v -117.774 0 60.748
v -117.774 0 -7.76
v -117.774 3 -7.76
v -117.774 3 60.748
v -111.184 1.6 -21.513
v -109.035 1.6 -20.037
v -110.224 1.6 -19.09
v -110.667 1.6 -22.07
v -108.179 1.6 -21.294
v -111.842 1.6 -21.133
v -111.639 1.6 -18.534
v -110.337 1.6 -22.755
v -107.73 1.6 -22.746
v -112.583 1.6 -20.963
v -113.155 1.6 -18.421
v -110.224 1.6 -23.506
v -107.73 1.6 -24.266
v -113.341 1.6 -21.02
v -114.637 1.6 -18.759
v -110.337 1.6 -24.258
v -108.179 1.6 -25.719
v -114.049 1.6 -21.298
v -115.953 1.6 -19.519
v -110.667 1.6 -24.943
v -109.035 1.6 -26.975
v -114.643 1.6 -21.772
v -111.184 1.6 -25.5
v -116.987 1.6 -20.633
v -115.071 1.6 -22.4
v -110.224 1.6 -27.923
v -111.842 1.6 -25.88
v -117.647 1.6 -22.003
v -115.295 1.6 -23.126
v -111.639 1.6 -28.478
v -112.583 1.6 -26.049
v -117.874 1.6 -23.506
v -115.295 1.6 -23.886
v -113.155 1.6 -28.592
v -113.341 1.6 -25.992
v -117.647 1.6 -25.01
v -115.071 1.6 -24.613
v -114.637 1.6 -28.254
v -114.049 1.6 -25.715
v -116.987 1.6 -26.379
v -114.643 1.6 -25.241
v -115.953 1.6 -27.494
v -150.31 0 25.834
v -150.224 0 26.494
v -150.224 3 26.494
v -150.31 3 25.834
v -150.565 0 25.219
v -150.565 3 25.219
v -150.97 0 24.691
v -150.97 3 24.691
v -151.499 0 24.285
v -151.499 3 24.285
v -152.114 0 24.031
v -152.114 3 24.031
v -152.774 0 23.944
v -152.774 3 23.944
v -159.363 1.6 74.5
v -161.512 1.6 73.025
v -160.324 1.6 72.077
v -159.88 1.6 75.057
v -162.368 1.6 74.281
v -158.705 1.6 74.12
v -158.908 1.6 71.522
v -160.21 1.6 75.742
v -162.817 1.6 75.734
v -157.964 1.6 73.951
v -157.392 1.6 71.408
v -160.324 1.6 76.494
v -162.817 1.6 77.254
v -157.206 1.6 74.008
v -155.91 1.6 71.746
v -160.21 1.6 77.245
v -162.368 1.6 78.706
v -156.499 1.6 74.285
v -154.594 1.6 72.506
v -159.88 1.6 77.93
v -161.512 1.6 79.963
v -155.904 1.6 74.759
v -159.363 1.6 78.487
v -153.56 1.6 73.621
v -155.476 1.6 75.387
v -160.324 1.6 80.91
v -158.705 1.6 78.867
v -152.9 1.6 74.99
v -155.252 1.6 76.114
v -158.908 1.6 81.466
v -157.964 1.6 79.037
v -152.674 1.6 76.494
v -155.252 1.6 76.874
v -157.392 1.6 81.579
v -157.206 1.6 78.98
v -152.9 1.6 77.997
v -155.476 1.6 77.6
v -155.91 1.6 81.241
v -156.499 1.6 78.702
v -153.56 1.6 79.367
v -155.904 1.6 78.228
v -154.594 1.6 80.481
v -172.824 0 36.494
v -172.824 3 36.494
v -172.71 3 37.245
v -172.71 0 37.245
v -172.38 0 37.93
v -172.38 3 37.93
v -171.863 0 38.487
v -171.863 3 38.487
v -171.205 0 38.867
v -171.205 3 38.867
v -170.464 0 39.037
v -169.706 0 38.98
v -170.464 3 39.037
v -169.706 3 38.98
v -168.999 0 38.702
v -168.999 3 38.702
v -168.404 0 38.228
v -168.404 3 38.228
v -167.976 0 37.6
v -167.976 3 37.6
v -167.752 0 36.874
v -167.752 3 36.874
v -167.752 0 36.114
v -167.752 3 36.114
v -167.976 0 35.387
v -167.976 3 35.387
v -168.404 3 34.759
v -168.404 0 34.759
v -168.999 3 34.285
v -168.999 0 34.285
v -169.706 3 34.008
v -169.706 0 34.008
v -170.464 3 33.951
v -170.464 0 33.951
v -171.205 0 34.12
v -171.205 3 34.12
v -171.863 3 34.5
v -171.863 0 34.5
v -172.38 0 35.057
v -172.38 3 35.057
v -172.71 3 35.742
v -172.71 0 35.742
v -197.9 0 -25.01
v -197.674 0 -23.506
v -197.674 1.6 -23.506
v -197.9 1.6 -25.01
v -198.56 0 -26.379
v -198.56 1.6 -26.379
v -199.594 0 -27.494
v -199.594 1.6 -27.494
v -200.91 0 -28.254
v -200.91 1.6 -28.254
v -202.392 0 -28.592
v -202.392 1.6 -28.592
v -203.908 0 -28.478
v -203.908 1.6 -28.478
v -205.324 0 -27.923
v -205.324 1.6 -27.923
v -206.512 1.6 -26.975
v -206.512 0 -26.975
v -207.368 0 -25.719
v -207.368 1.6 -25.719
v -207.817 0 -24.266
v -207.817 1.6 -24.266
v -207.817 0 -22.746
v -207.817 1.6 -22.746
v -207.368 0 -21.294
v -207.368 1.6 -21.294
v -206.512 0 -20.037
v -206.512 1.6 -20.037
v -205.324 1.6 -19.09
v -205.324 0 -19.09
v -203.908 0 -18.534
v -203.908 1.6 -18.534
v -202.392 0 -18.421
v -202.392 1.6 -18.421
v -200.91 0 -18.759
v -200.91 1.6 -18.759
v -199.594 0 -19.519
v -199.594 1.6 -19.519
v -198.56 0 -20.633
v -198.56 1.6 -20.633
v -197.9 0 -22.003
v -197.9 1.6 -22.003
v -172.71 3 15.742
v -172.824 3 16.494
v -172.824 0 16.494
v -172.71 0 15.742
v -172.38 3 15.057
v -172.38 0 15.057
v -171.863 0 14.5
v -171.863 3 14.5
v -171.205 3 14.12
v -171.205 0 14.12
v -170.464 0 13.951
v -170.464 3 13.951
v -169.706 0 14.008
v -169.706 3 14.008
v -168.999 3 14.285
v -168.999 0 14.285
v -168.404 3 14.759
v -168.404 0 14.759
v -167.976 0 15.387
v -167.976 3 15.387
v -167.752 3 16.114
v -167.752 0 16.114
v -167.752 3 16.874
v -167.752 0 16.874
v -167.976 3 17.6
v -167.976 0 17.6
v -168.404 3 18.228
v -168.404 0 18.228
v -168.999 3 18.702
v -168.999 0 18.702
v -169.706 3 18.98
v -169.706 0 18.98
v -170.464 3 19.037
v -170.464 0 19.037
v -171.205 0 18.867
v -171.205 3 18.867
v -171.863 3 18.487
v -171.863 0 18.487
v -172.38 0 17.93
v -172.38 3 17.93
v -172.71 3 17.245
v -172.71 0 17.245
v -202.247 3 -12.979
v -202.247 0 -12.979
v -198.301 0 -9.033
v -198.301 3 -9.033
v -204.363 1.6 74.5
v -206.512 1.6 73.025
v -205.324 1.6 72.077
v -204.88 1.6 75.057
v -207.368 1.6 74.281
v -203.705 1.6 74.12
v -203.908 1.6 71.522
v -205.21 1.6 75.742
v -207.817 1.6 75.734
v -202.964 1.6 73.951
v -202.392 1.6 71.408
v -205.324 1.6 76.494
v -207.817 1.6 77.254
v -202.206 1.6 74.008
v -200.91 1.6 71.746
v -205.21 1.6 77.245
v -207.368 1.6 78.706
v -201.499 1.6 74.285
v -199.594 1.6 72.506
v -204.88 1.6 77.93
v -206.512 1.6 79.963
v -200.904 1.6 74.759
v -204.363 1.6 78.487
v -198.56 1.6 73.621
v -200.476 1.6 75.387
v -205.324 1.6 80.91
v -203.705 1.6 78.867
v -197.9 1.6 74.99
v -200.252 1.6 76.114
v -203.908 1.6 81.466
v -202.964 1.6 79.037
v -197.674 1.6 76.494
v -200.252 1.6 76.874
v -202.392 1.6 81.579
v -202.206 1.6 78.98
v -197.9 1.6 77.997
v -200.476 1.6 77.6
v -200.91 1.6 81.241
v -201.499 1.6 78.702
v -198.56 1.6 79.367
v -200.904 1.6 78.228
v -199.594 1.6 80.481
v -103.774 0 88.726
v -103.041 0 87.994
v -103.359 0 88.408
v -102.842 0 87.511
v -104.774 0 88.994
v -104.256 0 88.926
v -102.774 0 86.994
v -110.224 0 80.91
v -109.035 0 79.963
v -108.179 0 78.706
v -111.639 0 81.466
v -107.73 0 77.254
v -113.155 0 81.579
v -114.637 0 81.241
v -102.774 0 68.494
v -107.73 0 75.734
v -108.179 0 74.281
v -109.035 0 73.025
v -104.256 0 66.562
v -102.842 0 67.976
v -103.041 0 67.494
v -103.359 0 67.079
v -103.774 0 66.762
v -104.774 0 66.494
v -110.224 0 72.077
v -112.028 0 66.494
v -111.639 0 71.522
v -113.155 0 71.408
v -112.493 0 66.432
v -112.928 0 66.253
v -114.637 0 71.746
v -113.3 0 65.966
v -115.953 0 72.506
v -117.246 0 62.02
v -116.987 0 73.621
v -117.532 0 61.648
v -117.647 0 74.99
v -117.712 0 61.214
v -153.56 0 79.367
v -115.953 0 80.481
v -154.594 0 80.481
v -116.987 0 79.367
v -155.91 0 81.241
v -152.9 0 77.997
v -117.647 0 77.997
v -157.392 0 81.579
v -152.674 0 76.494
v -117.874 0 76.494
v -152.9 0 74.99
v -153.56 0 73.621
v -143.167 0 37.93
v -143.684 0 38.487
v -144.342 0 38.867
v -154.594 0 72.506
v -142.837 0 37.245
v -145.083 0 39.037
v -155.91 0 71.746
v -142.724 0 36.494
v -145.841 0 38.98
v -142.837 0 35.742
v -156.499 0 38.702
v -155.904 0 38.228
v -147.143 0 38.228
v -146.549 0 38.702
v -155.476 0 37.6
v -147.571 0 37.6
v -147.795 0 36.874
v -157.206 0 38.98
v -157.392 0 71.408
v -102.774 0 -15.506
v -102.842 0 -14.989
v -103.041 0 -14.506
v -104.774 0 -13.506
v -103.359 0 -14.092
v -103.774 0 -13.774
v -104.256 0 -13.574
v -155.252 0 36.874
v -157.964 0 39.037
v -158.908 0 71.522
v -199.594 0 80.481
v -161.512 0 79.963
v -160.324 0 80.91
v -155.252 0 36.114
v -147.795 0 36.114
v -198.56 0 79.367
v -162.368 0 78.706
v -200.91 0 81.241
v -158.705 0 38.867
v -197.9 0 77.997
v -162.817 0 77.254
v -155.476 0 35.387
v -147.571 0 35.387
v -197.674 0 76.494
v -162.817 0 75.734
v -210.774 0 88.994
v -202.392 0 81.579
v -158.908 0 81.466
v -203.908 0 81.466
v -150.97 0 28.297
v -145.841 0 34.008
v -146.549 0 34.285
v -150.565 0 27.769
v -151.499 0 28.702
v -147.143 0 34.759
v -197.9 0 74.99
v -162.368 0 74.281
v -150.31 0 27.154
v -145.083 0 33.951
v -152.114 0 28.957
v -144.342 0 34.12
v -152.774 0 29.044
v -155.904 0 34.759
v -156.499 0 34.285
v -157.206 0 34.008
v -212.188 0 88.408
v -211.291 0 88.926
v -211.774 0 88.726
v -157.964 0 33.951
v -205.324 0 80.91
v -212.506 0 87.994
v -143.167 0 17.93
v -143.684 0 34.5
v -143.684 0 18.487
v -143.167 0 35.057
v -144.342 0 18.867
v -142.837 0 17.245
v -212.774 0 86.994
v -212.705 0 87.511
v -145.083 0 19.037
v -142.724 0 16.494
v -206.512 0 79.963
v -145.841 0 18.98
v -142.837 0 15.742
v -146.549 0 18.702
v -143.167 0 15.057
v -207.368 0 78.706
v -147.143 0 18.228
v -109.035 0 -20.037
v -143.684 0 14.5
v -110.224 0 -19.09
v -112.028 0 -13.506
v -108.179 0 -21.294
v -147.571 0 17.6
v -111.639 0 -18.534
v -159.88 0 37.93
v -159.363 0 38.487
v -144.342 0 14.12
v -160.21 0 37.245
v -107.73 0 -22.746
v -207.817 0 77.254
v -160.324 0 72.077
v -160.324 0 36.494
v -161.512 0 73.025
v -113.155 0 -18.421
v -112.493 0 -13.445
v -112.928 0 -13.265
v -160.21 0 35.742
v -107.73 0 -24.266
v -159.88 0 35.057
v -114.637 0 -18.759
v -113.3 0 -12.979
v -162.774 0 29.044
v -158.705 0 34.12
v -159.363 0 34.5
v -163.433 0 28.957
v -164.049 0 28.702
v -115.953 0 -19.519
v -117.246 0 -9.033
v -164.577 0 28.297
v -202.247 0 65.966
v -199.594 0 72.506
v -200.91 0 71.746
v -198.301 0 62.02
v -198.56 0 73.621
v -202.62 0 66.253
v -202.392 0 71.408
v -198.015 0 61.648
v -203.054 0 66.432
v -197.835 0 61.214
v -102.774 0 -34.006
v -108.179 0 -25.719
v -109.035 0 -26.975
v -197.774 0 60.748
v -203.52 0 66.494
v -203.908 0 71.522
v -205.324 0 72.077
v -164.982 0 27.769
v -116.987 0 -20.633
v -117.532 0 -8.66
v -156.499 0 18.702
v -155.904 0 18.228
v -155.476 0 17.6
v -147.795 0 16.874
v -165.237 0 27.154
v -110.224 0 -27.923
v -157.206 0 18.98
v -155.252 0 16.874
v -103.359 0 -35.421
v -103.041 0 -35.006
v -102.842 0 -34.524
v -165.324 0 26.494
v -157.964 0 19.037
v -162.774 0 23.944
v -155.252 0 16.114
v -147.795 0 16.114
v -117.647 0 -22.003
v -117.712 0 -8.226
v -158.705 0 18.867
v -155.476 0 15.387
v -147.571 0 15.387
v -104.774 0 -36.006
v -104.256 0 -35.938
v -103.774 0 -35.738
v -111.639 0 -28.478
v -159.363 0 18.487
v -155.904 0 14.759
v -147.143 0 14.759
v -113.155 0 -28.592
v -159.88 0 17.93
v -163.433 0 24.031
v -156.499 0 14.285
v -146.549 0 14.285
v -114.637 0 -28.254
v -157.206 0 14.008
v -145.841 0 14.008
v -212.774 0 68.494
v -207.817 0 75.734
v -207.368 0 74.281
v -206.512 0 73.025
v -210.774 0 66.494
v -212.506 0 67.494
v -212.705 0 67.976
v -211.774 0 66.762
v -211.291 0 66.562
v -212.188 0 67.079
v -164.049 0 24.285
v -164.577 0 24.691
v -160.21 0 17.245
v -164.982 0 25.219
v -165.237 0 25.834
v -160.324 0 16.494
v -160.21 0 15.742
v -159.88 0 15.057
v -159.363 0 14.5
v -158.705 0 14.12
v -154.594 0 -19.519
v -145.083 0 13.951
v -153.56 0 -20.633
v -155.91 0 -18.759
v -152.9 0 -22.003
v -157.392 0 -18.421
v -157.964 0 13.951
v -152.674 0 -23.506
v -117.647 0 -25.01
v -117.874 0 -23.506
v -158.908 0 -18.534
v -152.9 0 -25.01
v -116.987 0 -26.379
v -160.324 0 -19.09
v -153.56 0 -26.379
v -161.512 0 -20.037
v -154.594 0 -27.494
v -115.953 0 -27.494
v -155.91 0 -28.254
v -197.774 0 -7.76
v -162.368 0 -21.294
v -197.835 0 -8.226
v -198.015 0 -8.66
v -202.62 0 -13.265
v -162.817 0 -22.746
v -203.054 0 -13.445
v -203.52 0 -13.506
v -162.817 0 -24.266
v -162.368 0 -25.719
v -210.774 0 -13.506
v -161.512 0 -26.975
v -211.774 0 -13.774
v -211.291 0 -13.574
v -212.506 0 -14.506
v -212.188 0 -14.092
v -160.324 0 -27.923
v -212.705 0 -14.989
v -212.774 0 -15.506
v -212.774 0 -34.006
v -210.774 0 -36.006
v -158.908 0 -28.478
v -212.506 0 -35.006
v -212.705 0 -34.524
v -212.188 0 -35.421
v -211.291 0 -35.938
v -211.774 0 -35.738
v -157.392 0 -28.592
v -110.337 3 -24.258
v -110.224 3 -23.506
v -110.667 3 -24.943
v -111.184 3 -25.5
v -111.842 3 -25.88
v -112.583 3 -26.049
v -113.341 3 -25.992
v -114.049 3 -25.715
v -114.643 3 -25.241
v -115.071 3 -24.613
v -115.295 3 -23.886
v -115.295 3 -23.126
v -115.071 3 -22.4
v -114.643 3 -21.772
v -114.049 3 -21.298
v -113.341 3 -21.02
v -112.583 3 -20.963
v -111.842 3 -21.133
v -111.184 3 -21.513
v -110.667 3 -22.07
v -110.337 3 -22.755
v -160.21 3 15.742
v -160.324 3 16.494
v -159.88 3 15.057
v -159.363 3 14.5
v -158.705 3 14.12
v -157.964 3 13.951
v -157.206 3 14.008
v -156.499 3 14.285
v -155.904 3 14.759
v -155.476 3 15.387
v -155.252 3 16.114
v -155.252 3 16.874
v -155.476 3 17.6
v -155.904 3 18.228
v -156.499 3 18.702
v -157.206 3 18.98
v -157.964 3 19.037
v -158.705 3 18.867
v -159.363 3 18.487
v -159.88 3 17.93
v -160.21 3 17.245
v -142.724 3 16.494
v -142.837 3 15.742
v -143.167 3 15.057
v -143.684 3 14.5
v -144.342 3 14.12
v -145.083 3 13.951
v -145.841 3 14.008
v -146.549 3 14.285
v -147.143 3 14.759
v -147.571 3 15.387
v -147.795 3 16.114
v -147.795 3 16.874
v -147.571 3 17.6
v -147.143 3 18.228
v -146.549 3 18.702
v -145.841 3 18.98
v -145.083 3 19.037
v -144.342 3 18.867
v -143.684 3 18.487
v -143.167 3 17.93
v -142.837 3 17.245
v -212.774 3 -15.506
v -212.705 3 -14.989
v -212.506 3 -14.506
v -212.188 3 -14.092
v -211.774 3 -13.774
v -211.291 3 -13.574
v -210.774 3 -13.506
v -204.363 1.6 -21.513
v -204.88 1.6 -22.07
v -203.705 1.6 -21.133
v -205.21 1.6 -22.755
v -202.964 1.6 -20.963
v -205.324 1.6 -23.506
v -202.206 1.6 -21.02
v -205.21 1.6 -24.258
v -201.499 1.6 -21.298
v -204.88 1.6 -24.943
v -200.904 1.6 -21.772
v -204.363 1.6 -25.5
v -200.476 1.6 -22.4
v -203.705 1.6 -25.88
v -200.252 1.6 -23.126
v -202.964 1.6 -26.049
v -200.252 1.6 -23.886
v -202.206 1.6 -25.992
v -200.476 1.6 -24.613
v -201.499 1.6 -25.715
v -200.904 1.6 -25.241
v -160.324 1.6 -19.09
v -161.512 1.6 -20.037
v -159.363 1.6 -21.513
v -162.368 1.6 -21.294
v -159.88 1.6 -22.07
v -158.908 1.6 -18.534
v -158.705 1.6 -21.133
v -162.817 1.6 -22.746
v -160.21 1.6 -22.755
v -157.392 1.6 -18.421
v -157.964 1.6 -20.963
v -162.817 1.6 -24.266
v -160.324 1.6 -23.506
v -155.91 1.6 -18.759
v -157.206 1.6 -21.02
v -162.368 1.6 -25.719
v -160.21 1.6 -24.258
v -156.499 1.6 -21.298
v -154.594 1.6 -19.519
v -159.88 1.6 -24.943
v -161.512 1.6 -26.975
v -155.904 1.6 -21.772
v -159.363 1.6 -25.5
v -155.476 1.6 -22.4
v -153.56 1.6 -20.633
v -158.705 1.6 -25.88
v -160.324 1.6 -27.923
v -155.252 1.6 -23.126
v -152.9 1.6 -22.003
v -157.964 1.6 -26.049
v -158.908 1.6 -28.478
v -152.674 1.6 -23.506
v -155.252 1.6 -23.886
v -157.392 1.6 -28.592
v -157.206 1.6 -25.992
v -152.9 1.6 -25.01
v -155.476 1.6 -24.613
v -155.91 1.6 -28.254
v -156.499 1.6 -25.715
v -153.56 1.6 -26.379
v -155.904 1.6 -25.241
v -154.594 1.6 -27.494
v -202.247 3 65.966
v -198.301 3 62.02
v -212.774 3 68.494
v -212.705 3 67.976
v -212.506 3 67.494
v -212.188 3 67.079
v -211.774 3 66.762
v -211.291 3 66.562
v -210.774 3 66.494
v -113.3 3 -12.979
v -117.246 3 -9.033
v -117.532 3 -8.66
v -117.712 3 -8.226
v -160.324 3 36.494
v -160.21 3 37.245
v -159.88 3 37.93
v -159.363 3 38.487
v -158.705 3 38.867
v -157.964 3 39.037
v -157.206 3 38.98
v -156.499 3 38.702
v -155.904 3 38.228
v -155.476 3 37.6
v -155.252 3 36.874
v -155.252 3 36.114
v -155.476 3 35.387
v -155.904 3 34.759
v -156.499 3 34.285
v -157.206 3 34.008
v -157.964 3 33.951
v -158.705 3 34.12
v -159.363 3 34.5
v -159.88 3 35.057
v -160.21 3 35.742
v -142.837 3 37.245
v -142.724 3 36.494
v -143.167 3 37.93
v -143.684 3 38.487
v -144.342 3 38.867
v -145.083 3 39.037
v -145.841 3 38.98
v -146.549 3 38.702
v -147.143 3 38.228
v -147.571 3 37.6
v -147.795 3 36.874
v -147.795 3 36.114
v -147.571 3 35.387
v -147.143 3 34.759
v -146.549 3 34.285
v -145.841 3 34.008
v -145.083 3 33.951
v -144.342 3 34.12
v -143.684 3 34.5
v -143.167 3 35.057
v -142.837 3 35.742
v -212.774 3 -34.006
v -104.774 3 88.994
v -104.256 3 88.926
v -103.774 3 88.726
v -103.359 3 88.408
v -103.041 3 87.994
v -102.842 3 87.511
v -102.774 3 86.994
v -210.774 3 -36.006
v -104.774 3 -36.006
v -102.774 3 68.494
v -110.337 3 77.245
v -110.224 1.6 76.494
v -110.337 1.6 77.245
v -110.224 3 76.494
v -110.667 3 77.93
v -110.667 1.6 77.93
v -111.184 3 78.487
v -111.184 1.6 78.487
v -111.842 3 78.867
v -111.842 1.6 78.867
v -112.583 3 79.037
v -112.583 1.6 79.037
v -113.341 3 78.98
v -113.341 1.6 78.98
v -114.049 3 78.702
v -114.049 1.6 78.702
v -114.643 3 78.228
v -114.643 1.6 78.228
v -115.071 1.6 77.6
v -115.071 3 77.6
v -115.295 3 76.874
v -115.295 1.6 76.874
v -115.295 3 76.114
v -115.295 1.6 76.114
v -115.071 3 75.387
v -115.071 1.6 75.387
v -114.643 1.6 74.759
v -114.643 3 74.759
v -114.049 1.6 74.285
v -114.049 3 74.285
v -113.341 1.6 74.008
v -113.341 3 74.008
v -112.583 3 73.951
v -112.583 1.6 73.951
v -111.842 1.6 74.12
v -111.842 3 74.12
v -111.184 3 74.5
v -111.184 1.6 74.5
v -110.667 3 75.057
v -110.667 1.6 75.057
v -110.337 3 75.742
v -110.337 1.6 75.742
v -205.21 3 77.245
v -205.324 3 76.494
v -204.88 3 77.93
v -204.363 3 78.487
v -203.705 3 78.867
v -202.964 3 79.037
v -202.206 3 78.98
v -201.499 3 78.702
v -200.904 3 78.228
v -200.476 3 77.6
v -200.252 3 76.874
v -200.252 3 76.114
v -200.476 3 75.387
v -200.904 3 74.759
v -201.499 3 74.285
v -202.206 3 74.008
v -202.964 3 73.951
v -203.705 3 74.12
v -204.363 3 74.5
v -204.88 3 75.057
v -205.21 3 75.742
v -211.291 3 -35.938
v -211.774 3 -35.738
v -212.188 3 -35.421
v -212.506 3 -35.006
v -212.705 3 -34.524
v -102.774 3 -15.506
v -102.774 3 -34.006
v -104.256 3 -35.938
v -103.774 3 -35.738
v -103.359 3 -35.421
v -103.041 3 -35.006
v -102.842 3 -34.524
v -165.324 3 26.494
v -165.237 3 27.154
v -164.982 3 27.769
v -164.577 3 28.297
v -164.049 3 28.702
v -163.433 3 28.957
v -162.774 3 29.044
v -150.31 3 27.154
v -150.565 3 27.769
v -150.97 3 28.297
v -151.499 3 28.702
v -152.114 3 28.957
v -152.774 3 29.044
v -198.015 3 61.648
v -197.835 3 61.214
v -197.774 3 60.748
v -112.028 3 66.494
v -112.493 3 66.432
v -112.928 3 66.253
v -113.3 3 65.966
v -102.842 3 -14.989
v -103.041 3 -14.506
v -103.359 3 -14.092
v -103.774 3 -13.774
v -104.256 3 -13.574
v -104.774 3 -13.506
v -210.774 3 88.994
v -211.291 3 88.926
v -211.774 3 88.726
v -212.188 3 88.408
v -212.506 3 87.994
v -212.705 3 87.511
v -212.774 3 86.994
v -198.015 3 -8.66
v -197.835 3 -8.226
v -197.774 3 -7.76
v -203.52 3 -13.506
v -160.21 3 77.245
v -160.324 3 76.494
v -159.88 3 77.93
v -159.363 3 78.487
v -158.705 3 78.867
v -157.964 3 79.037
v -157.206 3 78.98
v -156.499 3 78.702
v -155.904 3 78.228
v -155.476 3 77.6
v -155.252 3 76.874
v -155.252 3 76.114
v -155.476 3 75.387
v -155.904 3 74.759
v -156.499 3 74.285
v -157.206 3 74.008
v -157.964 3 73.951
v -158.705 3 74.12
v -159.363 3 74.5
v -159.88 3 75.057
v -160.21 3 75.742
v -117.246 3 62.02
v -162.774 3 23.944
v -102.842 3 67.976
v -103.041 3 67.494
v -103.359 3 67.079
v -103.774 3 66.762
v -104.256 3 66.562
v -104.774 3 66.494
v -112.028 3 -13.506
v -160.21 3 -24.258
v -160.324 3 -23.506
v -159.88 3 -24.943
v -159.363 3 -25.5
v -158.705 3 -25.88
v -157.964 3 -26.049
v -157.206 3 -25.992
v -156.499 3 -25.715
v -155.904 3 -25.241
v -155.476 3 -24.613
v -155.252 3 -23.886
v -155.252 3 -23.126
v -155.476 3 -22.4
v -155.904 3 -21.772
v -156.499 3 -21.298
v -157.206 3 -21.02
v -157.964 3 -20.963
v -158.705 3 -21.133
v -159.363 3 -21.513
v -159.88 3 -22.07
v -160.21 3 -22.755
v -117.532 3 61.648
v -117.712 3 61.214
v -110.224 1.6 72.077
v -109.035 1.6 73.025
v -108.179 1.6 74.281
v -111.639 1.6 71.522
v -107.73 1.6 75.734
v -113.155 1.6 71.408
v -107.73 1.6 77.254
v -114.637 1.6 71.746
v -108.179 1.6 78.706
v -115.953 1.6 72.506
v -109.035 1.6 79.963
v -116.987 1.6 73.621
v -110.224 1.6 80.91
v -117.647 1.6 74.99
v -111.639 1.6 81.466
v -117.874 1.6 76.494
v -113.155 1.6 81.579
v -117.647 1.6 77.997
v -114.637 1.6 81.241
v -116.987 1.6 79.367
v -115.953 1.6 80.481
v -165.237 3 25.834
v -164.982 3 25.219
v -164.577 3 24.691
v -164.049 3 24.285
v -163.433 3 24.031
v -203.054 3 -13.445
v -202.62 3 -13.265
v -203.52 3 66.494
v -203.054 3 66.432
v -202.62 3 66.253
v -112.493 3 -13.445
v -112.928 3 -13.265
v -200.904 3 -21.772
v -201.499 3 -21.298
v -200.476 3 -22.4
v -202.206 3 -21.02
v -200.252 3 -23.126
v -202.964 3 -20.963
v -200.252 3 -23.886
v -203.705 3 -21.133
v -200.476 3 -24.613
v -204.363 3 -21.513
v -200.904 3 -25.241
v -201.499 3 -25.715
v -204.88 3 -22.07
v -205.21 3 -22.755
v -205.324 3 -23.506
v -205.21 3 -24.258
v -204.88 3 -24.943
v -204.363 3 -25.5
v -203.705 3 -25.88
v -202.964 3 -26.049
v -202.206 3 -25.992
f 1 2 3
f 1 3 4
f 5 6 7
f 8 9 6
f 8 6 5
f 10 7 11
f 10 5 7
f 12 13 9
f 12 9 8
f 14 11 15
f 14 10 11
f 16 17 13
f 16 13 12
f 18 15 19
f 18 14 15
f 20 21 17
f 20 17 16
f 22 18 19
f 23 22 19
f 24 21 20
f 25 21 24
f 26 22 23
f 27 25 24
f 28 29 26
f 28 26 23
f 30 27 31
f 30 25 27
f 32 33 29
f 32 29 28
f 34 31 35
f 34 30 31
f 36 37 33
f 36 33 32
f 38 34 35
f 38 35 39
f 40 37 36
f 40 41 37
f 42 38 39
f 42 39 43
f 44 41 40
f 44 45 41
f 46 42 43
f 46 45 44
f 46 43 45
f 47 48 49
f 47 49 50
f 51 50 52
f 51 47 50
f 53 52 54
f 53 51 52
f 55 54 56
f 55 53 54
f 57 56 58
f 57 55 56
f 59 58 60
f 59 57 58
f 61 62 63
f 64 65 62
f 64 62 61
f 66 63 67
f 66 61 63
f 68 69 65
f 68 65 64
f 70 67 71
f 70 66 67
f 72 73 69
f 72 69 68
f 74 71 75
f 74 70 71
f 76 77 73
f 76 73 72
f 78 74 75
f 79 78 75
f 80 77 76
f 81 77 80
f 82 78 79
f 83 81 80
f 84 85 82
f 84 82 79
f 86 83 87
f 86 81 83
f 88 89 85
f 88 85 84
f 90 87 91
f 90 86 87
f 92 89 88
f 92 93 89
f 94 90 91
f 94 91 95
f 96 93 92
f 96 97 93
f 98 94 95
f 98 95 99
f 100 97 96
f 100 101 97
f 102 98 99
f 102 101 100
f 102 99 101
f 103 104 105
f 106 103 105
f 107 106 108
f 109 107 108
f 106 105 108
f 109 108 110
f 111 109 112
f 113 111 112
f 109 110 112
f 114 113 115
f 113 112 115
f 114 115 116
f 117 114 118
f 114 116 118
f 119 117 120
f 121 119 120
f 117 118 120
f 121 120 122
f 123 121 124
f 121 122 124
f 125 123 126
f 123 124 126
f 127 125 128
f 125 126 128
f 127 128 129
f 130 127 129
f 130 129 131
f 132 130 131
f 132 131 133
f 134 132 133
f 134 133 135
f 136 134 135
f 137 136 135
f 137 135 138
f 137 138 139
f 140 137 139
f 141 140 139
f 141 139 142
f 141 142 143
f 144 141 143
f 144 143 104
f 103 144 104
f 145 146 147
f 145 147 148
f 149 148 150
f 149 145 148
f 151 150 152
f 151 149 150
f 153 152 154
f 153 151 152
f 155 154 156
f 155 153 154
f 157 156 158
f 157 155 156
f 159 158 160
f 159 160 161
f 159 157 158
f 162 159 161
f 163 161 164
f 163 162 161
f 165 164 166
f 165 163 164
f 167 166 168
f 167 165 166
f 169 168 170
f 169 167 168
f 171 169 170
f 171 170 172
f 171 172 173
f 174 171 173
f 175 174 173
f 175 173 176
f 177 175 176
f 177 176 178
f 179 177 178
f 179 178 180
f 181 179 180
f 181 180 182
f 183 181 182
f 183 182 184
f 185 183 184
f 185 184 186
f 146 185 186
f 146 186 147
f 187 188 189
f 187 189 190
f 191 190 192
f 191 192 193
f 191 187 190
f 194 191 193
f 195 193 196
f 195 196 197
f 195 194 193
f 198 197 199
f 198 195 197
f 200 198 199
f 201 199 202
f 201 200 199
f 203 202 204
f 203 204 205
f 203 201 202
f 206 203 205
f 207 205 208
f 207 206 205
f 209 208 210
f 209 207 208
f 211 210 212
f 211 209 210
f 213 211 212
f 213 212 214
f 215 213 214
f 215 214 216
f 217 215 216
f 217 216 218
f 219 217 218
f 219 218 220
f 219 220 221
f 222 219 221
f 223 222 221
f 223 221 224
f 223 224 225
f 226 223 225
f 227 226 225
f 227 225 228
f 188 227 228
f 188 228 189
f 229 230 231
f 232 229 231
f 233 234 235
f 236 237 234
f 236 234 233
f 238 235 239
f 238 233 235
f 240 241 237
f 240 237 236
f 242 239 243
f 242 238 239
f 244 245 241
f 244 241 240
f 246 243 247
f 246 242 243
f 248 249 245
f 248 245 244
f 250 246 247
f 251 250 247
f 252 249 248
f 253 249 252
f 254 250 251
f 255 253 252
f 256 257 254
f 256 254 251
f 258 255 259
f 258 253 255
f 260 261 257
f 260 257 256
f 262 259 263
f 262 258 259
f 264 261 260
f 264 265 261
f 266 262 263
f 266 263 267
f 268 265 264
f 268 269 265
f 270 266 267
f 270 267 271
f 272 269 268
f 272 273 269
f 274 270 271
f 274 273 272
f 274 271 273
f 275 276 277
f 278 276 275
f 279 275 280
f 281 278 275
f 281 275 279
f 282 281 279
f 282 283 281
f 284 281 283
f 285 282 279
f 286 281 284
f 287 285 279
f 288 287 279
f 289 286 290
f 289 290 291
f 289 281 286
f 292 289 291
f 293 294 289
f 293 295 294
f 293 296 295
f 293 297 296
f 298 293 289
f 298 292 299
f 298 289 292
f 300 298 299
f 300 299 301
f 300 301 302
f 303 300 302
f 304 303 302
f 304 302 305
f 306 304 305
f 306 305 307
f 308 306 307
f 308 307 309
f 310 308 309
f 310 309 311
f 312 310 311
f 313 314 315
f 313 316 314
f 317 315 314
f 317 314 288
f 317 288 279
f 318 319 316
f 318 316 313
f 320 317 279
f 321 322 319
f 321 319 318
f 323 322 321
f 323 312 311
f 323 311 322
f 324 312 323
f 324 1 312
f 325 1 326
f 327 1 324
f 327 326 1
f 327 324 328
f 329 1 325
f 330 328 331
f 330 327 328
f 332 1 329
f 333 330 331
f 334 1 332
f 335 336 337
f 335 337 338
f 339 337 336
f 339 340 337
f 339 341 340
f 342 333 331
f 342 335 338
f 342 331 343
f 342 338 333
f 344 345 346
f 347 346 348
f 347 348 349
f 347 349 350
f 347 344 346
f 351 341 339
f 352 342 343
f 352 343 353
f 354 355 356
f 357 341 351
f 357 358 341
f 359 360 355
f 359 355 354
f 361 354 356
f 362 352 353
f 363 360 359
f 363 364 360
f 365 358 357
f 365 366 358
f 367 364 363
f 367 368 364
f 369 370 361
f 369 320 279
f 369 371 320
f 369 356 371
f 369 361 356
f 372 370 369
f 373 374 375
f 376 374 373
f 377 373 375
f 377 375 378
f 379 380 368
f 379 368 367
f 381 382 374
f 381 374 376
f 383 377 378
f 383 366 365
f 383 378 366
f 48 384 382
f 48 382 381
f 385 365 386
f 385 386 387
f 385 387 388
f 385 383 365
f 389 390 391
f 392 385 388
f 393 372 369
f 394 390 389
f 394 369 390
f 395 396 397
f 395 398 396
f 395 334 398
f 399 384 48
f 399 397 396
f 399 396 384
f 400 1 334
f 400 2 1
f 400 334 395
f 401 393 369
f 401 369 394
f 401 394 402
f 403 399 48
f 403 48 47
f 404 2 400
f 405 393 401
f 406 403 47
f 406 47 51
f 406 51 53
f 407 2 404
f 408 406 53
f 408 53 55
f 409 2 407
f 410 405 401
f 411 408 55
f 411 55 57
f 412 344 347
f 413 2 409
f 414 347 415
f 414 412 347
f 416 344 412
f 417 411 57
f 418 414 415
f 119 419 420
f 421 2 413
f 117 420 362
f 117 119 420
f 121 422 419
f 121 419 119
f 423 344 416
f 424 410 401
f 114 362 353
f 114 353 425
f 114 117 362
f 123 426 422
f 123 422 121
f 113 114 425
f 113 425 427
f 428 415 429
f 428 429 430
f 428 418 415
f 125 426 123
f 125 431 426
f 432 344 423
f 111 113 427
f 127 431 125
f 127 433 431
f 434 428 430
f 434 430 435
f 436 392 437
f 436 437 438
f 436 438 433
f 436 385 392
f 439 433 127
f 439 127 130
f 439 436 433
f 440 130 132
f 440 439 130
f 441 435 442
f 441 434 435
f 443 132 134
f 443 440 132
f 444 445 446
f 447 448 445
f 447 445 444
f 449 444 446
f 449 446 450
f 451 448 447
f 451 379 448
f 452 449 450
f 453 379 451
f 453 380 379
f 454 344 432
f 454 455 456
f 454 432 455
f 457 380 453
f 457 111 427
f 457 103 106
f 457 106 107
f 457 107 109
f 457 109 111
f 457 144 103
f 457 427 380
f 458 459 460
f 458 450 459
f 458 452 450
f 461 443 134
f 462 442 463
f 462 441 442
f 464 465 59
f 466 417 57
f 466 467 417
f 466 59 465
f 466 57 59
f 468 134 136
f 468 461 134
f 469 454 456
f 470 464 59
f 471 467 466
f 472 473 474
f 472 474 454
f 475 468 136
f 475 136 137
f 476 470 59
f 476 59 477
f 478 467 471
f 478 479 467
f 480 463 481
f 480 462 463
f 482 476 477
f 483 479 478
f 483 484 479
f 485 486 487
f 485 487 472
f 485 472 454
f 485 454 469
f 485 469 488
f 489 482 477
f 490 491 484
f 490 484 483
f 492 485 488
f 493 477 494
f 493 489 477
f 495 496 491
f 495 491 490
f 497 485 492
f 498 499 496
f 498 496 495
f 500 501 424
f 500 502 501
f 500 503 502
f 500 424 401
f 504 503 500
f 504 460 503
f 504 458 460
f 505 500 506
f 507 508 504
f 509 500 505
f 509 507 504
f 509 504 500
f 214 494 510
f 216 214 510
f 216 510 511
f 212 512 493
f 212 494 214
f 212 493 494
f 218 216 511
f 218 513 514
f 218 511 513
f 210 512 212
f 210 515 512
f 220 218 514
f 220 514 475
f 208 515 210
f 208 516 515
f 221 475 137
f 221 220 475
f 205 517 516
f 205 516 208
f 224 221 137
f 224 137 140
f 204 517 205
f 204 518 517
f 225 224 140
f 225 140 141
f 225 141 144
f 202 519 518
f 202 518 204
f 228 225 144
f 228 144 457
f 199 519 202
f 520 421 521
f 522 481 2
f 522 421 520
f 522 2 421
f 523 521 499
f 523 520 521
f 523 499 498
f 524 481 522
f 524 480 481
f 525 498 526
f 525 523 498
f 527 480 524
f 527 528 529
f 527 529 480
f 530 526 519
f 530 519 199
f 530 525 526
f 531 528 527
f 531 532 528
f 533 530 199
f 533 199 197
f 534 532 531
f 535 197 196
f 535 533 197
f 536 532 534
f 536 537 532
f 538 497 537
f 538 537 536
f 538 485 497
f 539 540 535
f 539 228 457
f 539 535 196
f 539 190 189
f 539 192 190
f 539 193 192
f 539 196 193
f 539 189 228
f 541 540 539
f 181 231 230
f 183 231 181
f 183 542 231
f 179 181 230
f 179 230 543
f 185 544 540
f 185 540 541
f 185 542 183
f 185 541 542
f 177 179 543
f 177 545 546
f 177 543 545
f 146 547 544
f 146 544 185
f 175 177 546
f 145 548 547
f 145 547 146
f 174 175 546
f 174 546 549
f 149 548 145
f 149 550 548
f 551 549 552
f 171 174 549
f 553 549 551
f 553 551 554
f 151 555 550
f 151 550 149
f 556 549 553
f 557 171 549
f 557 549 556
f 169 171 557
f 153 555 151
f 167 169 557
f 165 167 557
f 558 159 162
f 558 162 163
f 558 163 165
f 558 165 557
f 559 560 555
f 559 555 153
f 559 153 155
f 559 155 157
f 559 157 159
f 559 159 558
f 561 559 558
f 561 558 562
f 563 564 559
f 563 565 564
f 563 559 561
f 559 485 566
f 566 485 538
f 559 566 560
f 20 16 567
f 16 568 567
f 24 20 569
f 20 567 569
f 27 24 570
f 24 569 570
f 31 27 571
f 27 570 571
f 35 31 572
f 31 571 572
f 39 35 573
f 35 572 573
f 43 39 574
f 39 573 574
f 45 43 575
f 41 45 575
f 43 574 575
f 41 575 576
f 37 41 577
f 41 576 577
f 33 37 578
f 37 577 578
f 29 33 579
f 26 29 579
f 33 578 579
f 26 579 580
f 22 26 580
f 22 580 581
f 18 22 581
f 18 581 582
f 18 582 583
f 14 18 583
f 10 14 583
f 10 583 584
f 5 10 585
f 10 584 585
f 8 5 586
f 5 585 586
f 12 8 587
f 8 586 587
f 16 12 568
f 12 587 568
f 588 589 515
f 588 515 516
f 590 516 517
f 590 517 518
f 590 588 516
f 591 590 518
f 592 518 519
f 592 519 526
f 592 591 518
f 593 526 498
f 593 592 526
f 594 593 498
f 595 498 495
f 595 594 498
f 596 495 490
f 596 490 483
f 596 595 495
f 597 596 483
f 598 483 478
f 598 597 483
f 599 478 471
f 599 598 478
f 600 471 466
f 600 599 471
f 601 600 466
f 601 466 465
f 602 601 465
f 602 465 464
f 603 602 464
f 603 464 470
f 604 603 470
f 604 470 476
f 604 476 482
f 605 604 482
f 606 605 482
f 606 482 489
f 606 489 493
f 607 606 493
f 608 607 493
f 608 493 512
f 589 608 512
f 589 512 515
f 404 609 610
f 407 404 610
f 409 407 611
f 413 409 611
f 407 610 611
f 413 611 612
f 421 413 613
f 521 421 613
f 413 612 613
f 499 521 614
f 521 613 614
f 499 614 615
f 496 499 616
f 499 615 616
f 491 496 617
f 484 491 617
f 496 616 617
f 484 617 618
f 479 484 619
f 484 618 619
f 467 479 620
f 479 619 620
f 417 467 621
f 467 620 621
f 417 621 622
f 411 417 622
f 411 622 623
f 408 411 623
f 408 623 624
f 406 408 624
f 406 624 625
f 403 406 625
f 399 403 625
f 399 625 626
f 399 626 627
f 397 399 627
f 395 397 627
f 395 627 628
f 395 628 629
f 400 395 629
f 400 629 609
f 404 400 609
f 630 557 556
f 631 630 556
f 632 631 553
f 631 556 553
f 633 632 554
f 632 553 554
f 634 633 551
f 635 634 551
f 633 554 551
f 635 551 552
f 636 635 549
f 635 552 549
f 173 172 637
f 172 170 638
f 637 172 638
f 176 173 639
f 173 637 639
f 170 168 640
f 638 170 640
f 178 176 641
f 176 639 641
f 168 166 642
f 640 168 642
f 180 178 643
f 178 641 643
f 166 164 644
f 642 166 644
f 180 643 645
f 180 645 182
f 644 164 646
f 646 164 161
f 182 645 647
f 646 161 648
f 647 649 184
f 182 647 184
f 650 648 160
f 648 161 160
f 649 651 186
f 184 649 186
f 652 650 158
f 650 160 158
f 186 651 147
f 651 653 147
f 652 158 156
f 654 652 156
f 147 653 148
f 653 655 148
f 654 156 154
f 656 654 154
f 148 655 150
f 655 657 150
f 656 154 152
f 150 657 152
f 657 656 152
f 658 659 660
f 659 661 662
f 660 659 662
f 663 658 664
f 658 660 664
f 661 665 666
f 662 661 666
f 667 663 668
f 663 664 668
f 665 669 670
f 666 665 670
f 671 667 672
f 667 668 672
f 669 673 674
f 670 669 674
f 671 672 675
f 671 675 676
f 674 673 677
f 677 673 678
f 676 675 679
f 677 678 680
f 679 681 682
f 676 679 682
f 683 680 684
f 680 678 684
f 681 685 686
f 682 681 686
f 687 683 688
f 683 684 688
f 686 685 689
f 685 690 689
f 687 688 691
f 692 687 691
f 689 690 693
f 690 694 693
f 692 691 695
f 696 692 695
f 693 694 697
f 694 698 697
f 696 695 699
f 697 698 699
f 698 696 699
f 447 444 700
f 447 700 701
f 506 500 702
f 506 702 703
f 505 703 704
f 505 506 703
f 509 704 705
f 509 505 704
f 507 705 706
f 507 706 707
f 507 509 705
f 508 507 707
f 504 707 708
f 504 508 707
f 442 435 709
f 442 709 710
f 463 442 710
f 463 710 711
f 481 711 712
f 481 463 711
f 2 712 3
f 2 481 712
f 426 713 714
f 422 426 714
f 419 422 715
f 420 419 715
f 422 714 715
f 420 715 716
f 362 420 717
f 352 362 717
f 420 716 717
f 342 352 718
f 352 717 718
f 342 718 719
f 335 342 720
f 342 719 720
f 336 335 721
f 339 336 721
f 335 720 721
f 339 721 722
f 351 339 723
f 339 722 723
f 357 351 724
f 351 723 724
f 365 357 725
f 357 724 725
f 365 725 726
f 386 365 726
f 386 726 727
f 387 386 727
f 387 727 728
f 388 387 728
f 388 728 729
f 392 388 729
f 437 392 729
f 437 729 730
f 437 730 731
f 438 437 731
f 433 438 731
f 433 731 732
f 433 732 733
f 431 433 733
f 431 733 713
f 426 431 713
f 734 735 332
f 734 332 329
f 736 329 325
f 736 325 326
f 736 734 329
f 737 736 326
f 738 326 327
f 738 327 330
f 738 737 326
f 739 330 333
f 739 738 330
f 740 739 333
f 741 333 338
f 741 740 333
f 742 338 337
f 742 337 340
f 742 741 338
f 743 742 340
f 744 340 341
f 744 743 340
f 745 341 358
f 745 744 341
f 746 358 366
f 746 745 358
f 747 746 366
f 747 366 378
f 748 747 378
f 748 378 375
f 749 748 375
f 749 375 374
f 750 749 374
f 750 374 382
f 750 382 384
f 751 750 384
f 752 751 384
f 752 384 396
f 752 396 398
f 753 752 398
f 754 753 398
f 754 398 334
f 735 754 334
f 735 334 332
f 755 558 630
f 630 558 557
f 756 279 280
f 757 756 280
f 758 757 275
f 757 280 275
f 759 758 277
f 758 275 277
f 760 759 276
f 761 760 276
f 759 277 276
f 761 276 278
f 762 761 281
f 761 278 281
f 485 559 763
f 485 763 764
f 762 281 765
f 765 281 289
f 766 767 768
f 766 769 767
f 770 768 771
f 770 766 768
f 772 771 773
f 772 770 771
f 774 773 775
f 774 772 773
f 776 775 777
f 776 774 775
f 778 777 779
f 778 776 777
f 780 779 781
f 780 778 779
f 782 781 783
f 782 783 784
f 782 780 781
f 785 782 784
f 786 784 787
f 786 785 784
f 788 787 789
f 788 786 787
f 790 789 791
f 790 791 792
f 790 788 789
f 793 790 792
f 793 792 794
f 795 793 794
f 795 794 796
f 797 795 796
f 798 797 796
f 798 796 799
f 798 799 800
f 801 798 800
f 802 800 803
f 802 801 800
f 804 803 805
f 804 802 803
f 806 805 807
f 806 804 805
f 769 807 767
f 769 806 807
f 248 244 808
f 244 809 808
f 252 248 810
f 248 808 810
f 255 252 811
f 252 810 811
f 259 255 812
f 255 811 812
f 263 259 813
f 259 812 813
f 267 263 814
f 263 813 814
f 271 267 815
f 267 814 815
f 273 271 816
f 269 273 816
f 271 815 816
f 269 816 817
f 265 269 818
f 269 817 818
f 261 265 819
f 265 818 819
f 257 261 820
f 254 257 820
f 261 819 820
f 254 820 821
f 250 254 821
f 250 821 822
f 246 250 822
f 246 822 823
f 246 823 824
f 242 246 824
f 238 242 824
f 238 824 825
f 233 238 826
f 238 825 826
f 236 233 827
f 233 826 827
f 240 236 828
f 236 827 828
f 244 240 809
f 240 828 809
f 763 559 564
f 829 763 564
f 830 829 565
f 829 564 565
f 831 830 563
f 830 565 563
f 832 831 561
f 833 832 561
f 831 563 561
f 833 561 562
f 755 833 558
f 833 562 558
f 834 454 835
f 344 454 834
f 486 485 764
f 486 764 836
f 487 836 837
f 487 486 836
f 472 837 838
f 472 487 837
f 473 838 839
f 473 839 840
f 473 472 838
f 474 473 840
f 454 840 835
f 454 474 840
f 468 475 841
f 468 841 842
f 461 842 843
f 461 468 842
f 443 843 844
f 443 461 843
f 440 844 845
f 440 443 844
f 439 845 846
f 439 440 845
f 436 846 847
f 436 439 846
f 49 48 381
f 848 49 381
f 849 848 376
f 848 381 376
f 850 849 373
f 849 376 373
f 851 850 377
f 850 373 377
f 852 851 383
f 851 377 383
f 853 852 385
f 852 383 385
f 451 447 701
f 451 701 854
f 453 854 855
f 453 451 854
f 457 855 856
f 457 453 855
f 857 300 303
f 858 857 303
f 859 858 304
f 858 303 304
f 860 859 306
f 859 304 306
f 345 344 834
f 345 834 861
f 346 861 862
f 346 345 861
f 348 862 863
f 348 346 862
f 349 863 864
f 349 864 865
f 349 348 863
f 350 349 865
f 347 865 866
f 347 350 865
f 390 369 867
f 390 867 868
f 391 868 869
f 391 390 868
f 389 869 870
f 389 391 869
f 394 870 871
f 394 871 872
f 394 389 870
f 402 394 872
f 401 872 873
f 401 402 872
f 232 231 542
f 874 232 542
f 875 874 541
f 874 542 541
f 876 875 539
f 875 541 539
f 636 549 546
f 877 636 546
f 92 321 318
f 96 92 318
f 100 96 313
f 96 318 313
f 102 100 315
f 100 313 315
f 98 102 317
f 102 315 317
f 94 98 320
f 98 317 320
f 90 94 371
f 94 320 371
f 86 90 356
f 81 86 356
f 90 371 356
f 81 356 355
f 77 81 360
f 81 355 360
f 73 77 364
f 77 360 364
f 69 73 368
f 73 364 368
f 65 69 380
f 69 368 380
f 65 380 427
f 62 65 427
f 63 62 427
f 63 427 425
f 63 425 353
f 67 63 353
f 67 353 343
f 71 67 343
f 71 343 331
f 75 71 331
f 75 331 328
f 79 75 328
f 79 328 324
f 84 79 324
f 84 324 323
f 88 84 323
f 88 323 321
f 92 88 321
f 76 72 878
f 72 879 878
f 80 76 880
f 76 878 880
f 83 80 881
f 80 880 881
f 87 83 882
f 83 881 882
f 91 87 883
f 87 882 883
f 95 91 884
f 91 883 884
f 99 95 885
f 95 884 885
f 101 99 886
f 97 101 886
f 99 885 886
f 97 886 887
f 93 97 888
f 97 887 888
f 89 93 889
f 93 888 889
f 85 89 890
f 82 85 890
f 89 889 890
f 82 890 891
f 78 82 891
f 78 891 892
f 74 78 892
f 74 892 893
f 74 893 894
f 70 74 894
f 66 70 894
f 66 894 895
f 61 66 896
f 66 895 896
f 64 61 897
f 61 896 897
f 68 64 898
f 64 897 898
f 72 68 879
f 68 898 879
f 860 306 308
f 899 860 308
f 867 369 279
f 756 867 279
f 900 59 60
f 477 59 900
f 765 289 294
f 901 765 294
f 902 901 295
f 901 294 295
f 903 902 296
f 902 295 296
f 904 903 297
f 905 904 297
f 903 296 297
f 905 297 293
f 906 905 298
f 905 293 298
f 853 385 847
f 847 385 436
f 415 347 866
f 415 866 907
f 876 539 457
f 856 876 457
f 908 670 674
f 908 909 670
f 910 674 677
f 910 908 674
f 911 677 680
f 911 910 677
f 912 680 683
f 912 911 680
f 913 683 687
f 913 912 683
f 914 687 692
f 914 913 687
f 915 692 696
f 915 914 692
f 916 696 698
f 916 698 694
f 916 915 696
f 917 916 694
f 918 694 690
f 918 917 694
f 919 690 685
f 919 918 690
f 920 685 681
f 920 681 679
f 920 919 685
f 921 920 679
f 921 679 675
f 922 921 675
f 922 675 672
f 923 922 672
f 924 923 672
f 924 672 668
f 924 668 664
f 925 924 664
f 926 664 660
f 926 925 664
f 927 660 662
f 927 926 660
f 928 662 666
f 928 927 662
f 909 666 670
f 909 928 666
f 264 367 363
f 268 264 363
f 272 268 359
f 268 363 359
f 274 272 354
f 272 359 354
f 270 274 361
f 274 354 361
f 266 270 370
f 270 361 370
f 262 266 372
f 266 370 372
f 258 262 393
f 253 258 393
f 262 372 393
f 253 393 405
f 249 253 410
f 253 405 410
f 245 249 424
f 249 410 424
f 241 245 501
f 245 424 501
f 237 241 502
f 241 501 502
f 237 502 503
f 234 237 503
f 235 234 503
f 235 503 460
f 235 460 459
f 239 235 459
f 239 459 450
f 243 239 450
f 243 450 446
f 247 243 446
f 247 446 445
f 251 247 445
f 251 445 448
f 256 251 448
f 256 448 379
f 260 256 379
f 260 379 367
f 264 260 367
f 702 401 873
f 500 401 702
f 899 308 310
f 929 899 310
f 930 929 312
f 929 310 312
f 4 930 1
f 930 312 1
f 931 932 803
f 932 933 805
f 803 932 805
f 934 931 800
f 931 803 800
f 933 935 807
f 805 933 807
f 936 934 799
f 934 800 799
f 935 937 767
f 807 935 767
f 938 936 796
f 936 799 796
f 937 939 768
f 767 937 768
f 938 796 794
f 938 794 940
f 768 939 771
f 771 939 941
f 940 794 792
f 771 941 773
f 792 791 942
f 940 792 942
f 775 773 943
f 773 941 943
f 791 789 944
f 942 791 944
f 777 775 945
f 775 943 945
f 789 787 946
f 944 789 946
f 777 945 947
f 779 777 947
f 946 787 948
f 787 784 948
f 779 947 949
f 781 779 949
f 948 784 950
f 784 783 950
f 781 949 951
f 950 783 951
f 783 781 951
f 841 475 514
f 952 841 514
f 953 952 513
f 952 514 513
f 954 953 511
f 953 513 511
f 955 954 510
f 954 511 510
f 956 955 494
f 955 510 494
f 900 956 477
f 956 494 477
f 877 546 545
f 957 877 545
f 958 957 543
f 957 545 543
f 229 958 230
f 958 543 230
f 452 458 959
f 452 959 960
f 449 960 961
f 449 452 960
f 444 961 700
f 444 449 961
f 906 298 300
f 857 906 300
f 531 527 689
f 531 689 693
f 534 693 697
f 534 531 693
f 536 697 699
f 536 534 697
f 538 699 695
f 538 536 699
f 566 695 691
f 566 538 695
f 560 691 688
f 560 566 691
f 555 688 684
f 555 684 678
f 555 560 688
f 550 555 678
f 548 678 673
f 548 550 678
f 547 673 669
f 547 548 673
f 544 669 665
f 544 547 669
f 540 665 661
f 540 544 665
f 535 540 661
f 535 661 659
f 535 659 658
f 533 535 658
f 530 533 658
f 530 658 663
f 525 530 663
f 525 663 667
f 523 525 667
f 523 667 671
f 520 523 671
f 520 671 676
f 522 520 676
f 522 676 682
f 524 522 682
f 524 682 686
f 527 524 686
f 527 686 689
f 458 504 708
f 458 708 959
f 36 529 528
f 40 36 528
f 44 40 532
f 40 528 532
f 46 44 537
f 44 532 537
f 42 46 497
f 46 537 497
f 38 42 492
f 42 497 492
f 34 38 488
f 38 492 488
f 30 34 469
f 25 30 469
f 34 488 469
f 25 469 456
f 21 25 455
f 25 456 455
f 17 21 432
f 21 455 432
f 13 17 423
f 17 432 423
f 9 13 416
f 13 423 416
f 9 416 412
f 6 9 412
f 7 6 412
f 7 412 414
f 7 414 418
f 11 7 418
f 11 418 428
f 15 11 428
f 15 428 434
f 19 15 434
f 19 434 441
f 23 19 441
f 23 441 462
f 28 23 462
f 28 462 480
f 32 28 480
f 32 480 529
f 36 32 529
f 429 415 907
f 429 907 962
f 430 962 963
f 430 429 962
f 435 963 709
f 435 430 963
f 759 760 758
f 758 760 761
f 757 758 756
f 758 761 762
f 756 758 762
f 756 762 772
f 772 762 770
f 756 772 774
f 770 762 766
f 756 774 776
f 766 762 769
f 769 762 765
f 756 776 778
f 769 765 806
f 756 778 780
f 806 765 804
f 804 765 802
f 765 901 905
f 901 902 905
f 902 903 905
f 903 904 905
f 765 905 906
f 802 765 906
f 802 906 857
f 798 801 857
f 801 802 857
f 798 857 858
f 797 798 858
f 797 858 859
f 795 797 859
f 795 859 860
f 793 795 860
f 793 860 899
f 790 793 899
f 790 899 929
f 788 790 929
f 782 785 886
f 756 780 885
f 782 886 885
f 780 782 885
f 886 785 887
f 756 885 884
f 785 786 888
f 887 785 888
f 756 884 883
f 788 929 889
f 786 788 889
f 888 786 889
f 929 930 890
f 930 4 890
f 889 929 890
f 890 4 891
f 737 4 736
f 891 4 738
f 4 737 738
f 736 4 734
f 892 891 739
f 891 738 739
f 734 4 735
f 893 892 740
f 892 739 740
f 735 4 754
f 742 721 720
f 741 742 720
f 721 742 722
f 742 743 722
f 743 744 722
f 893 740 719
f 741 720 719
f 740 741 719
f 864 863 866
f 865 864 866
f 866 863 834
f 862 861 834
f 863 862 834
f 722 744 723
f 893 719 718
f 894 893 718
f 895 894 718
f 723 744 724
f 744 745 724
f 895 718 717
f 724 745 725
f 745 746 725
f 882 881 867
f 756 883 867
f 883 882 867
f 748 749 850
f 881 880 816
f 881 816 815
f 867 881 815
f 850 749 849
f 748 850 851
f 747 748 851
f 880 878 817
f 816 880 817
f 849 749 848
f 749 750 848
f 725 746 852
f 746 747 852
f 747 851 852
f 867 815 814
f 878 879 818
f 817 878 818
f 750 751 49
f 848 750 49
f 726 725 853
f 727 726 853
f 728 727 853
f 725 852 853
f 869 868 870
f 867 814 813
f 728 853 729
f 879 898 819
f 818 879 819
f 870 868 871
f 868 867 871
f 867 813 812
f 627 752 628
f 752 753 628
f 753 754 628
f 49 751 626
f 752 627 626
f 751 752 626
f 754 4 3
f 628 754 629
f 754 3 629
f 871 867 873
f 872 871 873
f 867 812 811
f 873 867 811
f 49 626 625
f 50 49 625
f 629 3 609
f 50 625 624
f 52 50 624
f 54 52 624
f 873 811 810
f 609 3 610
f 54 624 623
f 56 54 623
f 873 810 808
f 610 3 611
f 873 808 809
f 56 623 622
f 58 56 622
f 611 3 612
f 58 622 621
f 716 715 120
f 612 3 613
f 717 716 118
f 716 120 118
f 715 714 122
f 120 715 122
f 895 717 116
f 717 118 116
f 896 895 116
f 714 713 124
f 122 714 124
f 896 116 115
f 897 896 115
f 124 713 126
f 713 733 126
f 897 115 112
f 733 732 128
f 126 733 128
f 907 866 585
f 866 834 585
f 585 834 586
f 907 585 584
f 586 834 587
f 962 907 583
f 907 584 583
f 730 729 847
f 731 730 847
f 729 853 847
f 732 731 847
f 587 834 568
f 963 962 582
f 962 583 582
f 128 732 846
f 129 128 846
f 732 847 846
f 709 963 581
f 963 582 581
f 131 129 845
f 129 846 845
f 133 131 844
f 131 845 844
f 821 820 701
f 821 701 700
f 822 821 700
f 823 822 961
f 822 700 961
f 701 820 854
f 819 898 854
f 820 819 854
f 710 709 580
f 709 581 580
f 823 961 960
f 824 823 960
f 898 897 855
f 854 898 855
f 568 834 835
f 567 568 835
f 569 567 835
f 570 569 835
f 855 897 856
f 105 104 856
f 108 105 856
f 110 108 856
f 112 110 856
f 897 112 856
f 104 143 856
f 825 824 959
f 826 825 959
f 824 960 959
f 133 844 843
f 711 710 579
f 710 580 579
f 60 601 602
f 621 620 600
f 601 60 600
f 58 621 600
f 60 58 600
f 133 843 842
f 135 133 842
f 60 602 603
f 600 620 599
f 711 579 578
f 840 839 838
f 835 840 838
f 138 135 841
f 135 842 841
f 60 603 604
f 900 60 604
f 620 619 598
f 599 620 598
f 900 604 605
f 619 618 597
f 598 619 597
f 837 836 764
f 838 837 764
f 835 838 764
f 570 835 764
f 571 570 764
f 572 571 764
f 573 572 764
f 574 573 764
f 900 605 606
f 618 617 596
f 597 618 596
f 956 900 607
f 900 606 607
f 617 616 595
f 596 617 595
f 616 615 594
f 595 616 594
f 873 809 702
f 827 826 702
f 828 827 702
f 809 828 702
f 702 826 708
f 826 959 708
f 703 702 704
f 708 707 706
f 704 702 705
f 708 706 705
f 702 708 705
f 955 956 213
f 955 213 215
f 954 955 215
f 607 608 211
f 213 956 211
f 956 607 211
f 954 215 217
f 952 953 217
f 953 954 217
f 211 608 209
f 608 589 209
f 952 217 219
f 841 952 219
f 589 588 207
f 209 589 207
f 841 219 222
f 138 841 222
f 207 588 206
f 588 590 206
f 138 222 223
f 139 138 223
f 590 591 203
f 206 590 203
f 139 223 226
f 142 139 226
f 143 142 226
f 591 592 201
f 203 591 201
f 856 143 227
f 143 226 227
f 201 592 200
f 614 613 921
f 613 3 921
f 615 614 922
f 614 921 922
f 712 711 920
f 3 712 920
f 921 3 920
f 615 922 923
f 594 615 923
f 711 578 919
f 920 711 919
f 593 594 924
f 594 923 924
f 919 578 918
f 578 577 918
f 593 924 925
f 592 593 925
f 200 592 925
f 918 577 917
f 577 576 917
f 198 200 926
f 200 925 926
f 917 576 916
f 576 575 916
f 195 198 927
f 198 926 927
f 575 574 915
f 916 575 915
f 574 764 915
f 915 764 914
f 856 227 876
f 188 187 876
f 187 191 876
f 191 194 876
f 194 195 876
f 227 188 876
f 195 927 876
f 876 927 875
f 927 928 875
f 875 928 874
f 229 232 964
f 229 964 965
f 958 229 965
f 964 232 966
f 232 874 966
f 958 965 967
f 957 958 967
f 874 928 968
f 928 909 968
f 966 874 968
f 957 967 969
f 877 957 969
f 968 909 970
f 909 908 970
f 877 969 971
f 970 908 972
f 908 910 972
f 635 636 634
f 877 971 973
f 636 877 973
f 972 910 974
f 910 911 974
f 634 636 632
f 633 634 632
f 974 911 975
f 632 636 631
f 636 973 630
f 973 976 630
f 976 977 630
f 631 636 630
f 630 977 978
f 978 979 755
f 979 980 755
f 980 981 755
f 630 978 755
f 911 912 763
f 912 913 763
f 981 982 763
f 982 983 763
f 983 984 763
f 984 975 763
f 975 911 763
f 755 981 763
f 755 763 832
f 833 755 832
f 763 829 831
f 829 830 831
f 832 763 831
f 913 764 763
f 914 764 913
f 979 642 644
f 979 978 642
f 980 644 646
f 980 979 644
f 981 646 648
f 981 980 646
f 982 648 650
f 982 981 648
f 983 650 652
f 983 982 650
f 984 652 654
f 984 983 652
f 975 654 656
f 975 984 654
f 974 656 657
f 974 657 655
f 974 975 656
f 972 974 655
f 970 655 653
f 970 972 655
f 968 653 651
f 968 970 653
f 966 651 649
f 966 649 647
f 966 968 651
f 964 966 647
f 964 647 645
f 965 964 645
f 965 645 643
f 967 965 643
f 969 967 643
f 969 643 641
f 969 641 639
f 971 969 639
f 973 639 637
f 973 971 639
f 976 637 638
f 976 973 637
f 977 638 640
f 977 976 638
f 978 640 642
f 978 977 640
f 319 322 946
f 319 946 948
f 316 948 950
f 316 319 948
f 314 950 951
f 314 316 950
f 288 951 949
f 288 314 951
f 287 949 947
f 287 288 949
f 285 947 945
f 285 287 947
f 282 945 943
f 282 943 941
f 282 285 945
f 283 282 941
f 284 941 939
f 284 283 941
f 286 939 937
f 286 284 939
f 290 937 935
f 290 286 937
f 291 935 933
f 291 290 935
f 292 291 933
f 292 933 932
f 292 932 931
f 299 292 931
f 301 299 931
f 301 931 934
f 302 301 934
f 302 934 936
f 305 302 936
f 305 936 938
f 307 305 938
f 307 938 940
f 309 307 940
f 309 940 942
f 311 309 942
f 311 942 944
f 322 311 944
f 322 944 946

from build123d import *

# Parameters (mm, degrees)
F1_DEPTH       = 3
F2_D           = 5.1
F2_DEPTH       = 34.5
F2_TIP         = 1.5321945785
F3_D           = 5.1
F3_DEPTH       = 34.5
F3_CBORE_D     = 10.2
F3_CBORE_DEPTH = 1.6
F3_TIP         = 1.5321945785
F5_D           = 5.1
F5_DEPTH       = 34.5
F5_TIP         = 1.5321945785
F6_D           = 5.1
F6_DEPTH       = 34.5
F6_CBORE_D     = 10.2
F6_CBORE_DEPTH = 1.6
F6_TIP         = 1.5321945785


# Not quite as in the source:
# - a feature names something its author has since deleted; it is built from what else it names


with BuildPart() as f1:
    # F0 (on Front) → F1 (new body)
    with BuildSketch(Plane.XZ):
        with BuildLine():
            Line((-157.7735108339, 88.9936834574), (-210.7735108339, 88.9936834574))
            ThreePointArc((-210.7735108339, 88.9936834574), (-212.1877243962, 88.4078970197), (-212.7735108339, 86.9936834574))
            Line((-212.7735108339, 86.9936834574), (-212.7735108339, 68.4936834574))
            ThreePointArc((-212.7735108339, 68.4936834574), (-212.1877243962, 67.079469895), (-210.7735108339, 66.4936834574))
            Line((-210.7735108339, 66.4936834574), (-203.5195108339, 66.4936834574))
            ThreePointArc((-203.5195108339, 66.4936834574), (-202.8306806556, 66.3566666159), (-202.2467186277, 65.9664756635))
            Line((-202.2467186277, 65.9664756635), (-198.3007186277, 62.0204756635))
            ThreePointArc((-198.3007186277, 62.0204756635), (-197.9105276754, 61.4365136356), (-197.7735108339, 60.7476834574))
            Line((-197.7735108339, 60.7476834574), (-197.7735108339, 26.4936834574))
            Line((-197.7735108339, 26.4936834574), (-165.3235108339, 26.4936834574))
            ThreePointArc((-165.3235108339, 26.4936834574), (-164.5766331259, 28.2968057494), (-162.7735108339, 29.0436834574))
            Line((-162.7735108339, 29.0436834574), (-157.7735108339, 29.0436834574))
            Line((-157.7735108339, 29.0436834574), (-157.7735108339, 88.9936834574))
        make_face()
    extrude(amount=-F1_DEPTH)

    # F2
    with Locations(Plane.XZ):
        with Locations((-170.2735108339, 36.4936834574)):
            Hole(F2_D / 2, depth=F2_DEPTH)
            with Locations((0, 0, -(F2_DEPTH + F2_TIP / 2))):  # 118° drill point
                Cone(0, F2_D / 2, F2_TIP, mode=Mode.SUBTRACT)

    # F3
    with Locations(Plane.XZ):
        with Locations((-202.7735108339, 76.4936834574)):
            CounterBoreHole(F3_D / 2, F3_CBORE_D / 2, F3_CBORE_DEPTH, depth=F3_DEPTH)
            with Locations((0, 0, -(F3_DEPTH + F3_TIP / 2))):  # 118° drill point
                Cone(0, F3_D / 2, F3_TIP, mode=Mode.SUBTRACT)

    # F4: F1 across face


with BuildPart() as f1_1:
    add(f1.part)
    add(f1.part.mirror(Plane(origin=(-157.7735108339, 1.5, 59.0186834574), x_dir=(0, 1, 0), z_dir=(1, 0, 0))))

    # F5
    with Locations(Plane.XZ):
        with Locations((-157.7735108339, 36.4936834574)):
            Hole(F5_D / 2, depth=F5_DEPTH)
            with Locations((0, 0, -(F5_DEPTH + F5_TIP / 2))):  # 118° drill point
                Cone(0, F5_D / 2, F5_TIP, mode=Mode.SUBTRACT)

    # F6
    with Locations(Plane.XZ):
        with Locations((-157.7735108339, 76.4936834574)):
            CounterBoreHole(F6_D / 2, F6_CBORE_D / 2, F6_CBORE_DEPTH, depth=F6_DEPTH)
            with Locations((0, 0, -(F6_DEPTH + F6_TIP / 2))):  # 118° drill point
                Cone(0, F6_D / 2, F6_TIP, mode=Mode.SUBTRACT)

    # F7: F1 across face


with BuildPart() as f1_2:
    add(f1_1.part)
    add(f1_1.part.mirror(Plane(origin=(-181.5485108339, 1.5, 26.4936834574), x_dir=(1, 0, 0), z_dir=(0, 0, -1))))


solid = f1_2.part
